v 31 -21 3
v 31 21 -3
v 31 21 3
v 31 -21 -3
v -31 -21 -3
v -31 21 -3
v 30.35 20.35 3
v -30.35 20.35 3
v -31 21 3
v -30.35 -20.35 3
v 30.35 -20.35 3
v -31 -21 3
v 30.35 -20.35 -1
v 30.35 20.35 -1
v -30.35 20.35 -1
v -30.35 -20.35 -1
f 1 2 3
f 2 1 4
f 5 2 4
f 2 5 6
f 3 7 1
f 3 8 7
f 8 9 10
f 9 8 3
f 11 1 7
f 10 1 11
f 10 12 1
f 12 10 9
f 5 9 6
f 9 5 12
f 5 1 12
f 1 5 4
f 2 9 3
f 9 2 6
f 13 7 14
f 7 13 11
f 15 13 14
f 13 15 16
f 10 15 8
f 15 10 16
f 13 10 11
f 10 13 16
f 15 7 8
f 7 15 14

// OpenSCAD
sizex  = 60;
sizey  = 40;
sizeh  = 30;
wall   = 2;
dewall = 5;
base   = 2;

lidh   = 6;
tolerance = 0.7;

rotate([180,0,0]) {
  translate([0,0,0]) {
    difference() {
      translate([0,0,0]) {
          cube([sizex+wall,sizey+wall,lidh], center = true);
      }
      translate([0,0,-base]) {cube([sizex+tolerance,sizey+tolerance,lidh], center = true);}
  //    translate([0,0,base]) {cube([sizex-wall,sizey-wall,sizeh-wall], center = true);}
    }
  }
}
